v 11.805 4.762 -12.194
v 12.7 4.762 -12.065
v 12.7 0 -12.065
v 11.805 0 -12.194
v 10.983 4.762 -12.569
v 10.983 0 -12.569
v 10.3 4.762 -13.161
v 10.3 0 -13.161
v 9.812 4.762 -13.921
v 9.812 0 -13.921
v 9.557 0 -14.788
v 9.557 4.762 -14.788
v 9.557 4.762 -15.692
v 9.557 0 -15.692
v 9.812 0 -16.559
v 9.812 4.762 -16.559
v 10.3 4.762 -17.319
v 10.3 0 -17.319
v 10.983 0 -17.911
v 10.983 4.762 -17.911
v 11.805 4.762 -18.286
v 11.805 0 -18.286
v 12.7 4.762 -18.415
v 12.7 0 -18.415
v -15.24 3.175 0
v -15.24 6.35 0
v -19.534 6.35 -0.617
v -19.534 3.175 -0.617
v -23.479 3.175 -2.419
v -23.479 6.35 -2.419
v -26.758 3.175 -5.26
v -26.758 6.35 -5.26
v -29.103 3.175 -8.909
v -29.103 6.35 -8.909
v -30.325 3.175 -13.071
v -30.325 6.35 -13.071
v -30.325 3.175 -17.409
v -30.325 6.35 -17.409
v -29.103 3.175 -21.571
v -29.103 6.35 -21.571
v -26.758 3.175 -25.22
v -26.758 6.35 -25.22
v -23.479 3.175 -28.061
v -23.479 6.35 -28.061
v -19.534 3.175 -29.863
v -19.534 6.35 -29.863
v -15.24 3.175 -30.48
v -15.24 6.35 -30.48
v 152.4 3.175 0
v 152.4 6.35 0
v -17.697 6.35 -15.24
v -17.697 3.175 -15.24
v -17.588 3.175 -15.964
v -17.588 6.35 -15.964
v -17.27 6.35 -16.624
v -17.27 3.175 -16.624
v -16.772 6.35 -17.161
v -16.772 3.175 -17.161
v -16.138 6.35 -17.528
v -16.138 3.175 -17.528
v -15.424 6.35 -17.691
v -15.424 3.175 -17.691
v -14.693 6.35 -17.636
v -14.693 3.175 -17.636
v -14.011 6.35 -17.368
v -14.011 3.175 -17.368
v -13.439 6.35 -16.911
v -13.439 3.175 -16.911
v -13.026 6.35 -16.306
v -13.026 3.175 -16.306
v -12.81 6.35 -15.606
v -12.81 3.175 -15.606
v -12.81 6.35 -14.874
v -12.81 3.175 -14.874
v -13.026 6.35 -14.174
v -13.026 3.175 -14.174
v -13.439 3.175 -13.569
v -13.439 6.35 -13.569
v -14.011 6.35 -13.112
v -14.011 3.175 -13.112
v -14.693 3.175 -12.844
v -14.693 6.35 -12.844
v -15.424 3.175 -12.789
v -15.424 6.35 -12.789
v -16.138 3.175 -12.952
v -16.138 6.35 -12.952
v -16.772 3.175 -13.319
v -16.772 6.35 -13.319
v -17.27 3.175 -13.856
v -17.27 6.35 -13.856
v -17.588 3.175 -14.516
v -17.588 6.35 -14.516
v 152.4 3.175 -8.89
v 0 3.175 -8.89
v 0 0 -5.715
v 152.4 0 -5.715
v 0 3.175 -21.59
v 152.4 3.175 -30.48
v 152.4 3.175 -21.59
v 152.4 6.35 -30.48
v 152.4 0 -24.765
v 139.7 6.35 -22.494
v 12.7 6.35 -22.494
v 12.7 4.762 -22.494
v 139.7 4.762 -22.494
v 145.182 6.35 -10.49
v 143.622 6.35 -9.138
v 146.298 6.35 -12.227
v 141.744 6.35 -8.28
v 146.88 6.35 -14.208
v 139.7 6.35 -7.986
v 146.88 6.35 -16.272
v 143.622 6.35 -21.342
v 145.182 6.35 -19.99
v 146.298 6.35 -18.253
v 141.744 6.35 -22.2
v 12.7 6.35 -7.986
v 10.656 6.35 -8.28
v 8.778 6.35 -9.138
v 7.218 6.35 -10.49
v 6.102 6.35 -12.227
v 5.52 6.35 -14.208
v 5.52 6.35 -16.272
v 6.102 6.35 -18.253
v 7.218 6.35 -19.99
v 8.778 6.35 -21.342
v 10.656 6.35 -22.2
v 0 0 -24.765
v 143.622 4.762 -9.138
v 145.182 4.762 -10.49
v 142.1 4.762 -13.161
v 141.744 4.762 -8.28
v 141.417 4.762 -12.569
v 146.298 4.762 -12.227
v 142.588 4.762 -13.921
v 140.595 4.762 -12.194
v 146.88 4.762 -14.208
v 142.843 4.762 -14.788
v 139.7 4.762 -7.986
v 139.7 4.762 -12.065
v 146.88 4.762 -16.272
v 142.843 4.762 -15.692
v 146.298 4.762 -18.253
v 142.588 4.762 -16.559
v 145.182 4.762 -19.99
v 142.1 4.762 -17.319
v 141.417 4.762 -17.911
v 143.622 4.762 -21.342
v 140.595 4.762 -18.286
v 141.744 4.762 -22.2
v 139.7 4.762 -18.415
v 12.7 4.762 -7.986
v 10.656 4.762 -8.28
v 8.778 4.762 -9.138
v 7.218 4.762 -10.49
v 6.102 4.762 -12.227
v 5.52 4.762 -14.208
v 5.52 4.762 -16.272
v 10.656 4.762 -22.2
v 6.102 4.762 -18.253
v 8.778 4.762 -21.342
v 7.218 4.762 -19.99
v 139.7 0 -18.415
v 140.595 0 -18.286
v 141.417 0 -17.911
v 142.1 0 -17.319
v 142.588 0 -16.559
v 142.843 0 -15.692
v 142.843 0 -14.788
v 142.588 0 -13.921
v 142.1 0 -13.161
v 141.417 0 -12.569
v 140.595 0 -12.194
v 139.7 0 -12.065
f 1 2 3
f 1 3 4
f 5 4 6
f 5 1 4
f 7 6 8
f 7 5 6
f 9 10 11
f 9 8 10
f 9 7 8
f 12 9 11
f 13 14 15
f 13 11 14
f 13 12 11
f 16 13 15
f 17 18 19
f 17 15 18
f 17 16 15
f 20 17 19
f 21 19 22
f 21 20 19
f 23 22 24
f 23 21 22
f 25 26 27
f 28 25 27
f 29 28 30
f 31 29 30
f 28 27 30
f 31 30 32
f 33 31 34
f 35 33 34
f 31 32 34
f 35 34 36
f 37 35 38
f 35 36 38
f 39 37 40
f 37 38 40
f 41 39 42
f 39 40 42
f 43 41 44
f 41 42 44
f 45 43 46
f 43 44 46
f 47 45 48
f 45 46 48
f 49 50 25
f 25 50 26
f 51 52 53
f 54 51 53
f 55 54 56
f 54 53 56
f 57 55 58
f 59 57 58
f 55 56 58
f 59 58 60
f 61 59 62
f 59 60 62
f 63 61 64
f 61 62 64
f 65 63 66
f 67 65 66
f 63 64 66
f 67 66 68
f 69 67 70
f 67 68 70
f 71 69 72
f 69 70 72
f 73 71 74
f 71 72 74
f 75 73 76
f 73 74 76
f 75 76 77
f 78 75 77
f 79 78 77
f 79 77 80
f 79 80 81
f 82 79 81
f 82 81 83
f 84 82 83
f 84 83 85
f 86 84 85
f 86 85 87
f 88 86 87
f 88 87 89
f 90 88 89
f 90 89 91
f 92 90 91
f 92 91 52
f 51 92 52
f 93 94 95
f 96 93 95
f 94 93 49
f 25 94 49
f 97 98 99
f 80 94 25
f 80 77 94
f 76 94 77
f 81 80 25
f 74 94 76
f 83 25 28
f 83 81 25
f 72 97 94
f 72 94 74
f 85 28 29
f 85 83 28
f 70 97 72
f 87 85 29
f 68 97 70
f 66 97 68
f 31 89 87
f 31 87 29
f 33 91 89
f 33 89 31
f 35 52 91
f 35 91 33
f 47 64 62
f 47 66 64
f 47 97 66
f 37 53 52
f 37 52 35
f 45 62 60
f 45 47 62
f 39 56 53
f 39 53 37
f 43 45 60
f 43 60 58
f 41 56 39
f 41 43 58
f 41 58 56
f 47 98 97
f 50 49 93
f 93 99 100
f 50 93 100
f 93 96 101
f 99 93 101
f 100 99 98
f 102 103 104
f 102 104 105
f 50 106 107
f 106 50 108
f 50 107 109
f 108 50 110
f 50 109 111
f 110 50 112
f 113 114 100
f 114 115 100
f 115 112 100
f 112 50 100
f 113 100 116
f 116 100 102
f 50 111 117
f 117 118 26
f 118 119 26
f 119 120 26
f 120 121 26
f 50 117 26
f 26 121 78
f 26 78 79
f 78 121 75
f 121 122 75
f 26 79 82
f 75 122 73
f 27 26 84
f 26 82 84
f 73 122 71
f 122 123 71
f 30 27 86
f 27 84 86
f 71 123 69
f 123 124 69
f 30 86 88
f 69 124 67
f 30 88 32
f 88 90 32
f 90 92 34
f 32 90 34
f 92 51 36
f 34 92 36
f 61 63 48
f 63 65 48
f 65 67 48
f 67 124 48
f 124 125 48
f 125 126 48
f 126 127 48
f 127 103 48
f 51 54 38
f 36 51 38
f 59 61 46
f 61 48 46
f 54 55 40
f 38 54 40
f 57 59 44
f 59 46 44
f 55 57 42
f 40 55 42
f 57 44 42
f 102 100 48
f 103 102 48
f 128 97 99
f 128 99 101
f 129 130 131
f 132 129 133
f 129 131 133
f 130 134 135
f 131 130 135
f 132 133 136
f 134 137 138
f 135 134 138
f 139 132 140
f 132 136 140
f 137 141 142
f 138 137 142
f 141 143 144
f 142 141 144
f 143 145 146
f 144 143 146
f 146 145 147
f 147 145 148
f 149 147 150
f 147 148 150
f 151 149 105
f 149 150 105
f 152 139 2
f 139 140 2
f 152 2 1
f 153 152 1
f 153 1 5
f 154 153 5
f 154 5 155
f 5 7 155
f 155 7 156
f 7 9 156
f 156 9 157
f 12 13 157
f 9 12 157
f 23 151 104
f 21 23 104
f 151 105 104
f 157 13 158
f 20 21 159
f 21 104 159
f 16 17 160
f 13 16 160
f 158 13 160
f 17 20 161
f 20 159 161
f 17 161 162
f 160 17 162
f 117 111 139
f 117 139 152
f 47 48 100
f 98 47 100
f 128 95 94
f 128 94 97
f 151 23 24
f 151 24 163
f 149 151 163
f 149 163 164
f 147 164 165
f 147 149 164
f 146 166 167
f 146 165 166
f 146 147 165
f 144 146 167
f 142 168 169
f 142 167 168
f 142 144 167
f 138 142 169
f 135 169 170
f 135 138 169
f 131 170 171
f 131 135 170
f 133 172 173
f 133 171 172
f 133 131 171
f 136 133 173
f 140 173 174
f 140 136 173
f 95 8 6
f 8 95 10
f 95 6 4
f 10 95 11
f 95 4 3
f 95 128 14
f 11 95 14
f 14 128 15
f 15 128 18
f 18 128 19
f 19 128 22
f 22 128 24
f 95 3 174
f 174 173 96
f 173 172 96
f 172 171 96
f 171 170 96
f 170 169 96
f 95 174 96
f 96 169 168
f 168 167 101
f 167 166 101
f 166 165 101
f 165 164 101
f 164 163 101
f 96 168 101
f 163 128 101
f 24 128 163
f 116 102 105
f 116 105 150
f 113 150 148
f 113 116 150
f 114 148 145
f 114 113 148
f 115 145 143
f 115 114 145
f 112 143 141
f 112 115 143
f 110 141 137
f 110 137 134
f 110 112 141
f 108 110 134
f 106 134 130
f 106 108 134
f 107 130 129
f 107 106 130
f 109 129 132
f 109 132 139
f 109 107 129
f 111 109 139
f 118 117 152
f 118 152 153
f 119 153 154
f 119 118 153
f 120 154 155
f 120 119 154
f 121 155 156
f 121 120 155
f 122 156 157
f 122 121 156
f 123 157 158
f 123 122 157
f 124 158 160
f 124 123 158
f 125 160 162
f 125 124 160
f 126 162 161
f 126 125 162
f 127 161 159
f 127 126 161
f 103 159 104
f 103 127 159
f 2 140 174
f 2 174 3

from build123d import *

# Parameters (mm, degrees)
SKETCH1_W             = 152.4
SKETCH1_H             = 30.48
BOSS_EXTRUDE1_DEPTH   = 6.35
CUT_EXTRUDE1_DEPTH    = 156.547783334
CUT_EXTRUDE2_DEPTH    = 1.5875
CUT_EXTRUDE3_DEPTH    = 156.547783334
BOSS_EXTRUDE2_DEPTH   = 3.175
F_8_CLEARANCE_HOLE1_D = 4.9149


with BuildPart() as part:
    # Sketch1 → Boss-Extrude1 (new body)
    with BuildSketch(Plane(origin=(0, 0, 0), x_dir=(1, 0, 0), z_dir=(0, 1, 0))):
        with Locations((76.2, 15.24)):
            Rectangle(SKETCH1_W, SKETCH1_H)
    extrude(amount=BOSS_EXTRUDE1_DEPTH)

    # Sketch2 → Cut-Extrude1 (cut, through all)
    with BuildSketch(Plane(origin=(0, 6.35, 0), x_dir=(1, 0, 0), z_dir=(0, 1, 0))):
        with BuildLine():
            Line((12.7, 18.415), (139.7, 18.415))
            ThreePointArc((139.7, 18.415), (142.875, 15.24), (139.7, 12.065))
            Line((139.7, 12.065), (12.7, 12.065))
            ThreePointArc((12.7, 12.065), (9.525, 15.24), (12.7, 18.415))
        make_face()
    extrude(amount=-CUT_EXTRUDE1_DEPTH, mode=Mode.SUBTRACT)

    # Sketch3 → Cut-Extrude2 (cut)
    with BuildSketch(Plane(origin=(0, 6.35, 0), x_dir=(1, 0, 0), z_dir=(0, 1, 0))):
        with BuildLine():
            Line((12.7, 22.493732), (139.7, 22.493732))
            ThreePointArc((139.7, 22.493732), (146.953732, 15.24), (139.7, 7.986268))
            Line((139.7, 7.986268), (12.7, 7.986268))
            ThreePointArc((12.7, 7.986268), (5.446268, 15.24), (12.7, 22.493732))
        make_face()
    extrude(amount=-CUT_EXTRUDE2_DEPTH, mode=Mode.SUBTRACT)

    # Sketch4 → Cut-Extrude3 (cut, through all)
    with BuildSketch(Plane.ZY):
        Polygon((-8.89, 3.175), (-5.715, 0), (0, 0), (0, 3.175), align=None)
    cut_extrude3 = extrude(amount=-CUT_EXTRUDE3_DEPTH, mode=Mode.SUBTRACT)

    # Mirror1: Cut-Extrude3 across plane
    add(cut_extrude3.mirror(Plane(origin=(0, 0, -15.24), x_dir=(1, 0, 0), z_dir=(0, 0, -1))), mode=Mode.SUBTRACT)

    # Sketch8 → Boss-Extrude2 (add)
    with BuildSketch(Plane(origin=(0, 6.35, 0), x_dir=(1, 0, 0), z_dir=(0, 1, 0))):
        with BuildLine():
            Line((0, 0), (-15.24, 0))
            ThreePointArc((-15.24, 0), (-30.48, 15.24), (-15.24, 30.48))
            Line((-15.24, 30.48), (0, 30.48))
            Line((0, 30.48), (0, 0))
        make_face()
    extrude(amount=-BOSS_EXTRUDE2_DEPTH)

    # #8 Clearance Hole1 (through all)
    with Locations(Plane(origin=(0, 6.35, 0), x_dir=(1, 0, 0), z_dir=(0, 1, 0))):
        with Locations((-15.24, 15.24)):
            Hole(F_8_CLEARANCE_HOLE1_D / 2)


solid = part.part
